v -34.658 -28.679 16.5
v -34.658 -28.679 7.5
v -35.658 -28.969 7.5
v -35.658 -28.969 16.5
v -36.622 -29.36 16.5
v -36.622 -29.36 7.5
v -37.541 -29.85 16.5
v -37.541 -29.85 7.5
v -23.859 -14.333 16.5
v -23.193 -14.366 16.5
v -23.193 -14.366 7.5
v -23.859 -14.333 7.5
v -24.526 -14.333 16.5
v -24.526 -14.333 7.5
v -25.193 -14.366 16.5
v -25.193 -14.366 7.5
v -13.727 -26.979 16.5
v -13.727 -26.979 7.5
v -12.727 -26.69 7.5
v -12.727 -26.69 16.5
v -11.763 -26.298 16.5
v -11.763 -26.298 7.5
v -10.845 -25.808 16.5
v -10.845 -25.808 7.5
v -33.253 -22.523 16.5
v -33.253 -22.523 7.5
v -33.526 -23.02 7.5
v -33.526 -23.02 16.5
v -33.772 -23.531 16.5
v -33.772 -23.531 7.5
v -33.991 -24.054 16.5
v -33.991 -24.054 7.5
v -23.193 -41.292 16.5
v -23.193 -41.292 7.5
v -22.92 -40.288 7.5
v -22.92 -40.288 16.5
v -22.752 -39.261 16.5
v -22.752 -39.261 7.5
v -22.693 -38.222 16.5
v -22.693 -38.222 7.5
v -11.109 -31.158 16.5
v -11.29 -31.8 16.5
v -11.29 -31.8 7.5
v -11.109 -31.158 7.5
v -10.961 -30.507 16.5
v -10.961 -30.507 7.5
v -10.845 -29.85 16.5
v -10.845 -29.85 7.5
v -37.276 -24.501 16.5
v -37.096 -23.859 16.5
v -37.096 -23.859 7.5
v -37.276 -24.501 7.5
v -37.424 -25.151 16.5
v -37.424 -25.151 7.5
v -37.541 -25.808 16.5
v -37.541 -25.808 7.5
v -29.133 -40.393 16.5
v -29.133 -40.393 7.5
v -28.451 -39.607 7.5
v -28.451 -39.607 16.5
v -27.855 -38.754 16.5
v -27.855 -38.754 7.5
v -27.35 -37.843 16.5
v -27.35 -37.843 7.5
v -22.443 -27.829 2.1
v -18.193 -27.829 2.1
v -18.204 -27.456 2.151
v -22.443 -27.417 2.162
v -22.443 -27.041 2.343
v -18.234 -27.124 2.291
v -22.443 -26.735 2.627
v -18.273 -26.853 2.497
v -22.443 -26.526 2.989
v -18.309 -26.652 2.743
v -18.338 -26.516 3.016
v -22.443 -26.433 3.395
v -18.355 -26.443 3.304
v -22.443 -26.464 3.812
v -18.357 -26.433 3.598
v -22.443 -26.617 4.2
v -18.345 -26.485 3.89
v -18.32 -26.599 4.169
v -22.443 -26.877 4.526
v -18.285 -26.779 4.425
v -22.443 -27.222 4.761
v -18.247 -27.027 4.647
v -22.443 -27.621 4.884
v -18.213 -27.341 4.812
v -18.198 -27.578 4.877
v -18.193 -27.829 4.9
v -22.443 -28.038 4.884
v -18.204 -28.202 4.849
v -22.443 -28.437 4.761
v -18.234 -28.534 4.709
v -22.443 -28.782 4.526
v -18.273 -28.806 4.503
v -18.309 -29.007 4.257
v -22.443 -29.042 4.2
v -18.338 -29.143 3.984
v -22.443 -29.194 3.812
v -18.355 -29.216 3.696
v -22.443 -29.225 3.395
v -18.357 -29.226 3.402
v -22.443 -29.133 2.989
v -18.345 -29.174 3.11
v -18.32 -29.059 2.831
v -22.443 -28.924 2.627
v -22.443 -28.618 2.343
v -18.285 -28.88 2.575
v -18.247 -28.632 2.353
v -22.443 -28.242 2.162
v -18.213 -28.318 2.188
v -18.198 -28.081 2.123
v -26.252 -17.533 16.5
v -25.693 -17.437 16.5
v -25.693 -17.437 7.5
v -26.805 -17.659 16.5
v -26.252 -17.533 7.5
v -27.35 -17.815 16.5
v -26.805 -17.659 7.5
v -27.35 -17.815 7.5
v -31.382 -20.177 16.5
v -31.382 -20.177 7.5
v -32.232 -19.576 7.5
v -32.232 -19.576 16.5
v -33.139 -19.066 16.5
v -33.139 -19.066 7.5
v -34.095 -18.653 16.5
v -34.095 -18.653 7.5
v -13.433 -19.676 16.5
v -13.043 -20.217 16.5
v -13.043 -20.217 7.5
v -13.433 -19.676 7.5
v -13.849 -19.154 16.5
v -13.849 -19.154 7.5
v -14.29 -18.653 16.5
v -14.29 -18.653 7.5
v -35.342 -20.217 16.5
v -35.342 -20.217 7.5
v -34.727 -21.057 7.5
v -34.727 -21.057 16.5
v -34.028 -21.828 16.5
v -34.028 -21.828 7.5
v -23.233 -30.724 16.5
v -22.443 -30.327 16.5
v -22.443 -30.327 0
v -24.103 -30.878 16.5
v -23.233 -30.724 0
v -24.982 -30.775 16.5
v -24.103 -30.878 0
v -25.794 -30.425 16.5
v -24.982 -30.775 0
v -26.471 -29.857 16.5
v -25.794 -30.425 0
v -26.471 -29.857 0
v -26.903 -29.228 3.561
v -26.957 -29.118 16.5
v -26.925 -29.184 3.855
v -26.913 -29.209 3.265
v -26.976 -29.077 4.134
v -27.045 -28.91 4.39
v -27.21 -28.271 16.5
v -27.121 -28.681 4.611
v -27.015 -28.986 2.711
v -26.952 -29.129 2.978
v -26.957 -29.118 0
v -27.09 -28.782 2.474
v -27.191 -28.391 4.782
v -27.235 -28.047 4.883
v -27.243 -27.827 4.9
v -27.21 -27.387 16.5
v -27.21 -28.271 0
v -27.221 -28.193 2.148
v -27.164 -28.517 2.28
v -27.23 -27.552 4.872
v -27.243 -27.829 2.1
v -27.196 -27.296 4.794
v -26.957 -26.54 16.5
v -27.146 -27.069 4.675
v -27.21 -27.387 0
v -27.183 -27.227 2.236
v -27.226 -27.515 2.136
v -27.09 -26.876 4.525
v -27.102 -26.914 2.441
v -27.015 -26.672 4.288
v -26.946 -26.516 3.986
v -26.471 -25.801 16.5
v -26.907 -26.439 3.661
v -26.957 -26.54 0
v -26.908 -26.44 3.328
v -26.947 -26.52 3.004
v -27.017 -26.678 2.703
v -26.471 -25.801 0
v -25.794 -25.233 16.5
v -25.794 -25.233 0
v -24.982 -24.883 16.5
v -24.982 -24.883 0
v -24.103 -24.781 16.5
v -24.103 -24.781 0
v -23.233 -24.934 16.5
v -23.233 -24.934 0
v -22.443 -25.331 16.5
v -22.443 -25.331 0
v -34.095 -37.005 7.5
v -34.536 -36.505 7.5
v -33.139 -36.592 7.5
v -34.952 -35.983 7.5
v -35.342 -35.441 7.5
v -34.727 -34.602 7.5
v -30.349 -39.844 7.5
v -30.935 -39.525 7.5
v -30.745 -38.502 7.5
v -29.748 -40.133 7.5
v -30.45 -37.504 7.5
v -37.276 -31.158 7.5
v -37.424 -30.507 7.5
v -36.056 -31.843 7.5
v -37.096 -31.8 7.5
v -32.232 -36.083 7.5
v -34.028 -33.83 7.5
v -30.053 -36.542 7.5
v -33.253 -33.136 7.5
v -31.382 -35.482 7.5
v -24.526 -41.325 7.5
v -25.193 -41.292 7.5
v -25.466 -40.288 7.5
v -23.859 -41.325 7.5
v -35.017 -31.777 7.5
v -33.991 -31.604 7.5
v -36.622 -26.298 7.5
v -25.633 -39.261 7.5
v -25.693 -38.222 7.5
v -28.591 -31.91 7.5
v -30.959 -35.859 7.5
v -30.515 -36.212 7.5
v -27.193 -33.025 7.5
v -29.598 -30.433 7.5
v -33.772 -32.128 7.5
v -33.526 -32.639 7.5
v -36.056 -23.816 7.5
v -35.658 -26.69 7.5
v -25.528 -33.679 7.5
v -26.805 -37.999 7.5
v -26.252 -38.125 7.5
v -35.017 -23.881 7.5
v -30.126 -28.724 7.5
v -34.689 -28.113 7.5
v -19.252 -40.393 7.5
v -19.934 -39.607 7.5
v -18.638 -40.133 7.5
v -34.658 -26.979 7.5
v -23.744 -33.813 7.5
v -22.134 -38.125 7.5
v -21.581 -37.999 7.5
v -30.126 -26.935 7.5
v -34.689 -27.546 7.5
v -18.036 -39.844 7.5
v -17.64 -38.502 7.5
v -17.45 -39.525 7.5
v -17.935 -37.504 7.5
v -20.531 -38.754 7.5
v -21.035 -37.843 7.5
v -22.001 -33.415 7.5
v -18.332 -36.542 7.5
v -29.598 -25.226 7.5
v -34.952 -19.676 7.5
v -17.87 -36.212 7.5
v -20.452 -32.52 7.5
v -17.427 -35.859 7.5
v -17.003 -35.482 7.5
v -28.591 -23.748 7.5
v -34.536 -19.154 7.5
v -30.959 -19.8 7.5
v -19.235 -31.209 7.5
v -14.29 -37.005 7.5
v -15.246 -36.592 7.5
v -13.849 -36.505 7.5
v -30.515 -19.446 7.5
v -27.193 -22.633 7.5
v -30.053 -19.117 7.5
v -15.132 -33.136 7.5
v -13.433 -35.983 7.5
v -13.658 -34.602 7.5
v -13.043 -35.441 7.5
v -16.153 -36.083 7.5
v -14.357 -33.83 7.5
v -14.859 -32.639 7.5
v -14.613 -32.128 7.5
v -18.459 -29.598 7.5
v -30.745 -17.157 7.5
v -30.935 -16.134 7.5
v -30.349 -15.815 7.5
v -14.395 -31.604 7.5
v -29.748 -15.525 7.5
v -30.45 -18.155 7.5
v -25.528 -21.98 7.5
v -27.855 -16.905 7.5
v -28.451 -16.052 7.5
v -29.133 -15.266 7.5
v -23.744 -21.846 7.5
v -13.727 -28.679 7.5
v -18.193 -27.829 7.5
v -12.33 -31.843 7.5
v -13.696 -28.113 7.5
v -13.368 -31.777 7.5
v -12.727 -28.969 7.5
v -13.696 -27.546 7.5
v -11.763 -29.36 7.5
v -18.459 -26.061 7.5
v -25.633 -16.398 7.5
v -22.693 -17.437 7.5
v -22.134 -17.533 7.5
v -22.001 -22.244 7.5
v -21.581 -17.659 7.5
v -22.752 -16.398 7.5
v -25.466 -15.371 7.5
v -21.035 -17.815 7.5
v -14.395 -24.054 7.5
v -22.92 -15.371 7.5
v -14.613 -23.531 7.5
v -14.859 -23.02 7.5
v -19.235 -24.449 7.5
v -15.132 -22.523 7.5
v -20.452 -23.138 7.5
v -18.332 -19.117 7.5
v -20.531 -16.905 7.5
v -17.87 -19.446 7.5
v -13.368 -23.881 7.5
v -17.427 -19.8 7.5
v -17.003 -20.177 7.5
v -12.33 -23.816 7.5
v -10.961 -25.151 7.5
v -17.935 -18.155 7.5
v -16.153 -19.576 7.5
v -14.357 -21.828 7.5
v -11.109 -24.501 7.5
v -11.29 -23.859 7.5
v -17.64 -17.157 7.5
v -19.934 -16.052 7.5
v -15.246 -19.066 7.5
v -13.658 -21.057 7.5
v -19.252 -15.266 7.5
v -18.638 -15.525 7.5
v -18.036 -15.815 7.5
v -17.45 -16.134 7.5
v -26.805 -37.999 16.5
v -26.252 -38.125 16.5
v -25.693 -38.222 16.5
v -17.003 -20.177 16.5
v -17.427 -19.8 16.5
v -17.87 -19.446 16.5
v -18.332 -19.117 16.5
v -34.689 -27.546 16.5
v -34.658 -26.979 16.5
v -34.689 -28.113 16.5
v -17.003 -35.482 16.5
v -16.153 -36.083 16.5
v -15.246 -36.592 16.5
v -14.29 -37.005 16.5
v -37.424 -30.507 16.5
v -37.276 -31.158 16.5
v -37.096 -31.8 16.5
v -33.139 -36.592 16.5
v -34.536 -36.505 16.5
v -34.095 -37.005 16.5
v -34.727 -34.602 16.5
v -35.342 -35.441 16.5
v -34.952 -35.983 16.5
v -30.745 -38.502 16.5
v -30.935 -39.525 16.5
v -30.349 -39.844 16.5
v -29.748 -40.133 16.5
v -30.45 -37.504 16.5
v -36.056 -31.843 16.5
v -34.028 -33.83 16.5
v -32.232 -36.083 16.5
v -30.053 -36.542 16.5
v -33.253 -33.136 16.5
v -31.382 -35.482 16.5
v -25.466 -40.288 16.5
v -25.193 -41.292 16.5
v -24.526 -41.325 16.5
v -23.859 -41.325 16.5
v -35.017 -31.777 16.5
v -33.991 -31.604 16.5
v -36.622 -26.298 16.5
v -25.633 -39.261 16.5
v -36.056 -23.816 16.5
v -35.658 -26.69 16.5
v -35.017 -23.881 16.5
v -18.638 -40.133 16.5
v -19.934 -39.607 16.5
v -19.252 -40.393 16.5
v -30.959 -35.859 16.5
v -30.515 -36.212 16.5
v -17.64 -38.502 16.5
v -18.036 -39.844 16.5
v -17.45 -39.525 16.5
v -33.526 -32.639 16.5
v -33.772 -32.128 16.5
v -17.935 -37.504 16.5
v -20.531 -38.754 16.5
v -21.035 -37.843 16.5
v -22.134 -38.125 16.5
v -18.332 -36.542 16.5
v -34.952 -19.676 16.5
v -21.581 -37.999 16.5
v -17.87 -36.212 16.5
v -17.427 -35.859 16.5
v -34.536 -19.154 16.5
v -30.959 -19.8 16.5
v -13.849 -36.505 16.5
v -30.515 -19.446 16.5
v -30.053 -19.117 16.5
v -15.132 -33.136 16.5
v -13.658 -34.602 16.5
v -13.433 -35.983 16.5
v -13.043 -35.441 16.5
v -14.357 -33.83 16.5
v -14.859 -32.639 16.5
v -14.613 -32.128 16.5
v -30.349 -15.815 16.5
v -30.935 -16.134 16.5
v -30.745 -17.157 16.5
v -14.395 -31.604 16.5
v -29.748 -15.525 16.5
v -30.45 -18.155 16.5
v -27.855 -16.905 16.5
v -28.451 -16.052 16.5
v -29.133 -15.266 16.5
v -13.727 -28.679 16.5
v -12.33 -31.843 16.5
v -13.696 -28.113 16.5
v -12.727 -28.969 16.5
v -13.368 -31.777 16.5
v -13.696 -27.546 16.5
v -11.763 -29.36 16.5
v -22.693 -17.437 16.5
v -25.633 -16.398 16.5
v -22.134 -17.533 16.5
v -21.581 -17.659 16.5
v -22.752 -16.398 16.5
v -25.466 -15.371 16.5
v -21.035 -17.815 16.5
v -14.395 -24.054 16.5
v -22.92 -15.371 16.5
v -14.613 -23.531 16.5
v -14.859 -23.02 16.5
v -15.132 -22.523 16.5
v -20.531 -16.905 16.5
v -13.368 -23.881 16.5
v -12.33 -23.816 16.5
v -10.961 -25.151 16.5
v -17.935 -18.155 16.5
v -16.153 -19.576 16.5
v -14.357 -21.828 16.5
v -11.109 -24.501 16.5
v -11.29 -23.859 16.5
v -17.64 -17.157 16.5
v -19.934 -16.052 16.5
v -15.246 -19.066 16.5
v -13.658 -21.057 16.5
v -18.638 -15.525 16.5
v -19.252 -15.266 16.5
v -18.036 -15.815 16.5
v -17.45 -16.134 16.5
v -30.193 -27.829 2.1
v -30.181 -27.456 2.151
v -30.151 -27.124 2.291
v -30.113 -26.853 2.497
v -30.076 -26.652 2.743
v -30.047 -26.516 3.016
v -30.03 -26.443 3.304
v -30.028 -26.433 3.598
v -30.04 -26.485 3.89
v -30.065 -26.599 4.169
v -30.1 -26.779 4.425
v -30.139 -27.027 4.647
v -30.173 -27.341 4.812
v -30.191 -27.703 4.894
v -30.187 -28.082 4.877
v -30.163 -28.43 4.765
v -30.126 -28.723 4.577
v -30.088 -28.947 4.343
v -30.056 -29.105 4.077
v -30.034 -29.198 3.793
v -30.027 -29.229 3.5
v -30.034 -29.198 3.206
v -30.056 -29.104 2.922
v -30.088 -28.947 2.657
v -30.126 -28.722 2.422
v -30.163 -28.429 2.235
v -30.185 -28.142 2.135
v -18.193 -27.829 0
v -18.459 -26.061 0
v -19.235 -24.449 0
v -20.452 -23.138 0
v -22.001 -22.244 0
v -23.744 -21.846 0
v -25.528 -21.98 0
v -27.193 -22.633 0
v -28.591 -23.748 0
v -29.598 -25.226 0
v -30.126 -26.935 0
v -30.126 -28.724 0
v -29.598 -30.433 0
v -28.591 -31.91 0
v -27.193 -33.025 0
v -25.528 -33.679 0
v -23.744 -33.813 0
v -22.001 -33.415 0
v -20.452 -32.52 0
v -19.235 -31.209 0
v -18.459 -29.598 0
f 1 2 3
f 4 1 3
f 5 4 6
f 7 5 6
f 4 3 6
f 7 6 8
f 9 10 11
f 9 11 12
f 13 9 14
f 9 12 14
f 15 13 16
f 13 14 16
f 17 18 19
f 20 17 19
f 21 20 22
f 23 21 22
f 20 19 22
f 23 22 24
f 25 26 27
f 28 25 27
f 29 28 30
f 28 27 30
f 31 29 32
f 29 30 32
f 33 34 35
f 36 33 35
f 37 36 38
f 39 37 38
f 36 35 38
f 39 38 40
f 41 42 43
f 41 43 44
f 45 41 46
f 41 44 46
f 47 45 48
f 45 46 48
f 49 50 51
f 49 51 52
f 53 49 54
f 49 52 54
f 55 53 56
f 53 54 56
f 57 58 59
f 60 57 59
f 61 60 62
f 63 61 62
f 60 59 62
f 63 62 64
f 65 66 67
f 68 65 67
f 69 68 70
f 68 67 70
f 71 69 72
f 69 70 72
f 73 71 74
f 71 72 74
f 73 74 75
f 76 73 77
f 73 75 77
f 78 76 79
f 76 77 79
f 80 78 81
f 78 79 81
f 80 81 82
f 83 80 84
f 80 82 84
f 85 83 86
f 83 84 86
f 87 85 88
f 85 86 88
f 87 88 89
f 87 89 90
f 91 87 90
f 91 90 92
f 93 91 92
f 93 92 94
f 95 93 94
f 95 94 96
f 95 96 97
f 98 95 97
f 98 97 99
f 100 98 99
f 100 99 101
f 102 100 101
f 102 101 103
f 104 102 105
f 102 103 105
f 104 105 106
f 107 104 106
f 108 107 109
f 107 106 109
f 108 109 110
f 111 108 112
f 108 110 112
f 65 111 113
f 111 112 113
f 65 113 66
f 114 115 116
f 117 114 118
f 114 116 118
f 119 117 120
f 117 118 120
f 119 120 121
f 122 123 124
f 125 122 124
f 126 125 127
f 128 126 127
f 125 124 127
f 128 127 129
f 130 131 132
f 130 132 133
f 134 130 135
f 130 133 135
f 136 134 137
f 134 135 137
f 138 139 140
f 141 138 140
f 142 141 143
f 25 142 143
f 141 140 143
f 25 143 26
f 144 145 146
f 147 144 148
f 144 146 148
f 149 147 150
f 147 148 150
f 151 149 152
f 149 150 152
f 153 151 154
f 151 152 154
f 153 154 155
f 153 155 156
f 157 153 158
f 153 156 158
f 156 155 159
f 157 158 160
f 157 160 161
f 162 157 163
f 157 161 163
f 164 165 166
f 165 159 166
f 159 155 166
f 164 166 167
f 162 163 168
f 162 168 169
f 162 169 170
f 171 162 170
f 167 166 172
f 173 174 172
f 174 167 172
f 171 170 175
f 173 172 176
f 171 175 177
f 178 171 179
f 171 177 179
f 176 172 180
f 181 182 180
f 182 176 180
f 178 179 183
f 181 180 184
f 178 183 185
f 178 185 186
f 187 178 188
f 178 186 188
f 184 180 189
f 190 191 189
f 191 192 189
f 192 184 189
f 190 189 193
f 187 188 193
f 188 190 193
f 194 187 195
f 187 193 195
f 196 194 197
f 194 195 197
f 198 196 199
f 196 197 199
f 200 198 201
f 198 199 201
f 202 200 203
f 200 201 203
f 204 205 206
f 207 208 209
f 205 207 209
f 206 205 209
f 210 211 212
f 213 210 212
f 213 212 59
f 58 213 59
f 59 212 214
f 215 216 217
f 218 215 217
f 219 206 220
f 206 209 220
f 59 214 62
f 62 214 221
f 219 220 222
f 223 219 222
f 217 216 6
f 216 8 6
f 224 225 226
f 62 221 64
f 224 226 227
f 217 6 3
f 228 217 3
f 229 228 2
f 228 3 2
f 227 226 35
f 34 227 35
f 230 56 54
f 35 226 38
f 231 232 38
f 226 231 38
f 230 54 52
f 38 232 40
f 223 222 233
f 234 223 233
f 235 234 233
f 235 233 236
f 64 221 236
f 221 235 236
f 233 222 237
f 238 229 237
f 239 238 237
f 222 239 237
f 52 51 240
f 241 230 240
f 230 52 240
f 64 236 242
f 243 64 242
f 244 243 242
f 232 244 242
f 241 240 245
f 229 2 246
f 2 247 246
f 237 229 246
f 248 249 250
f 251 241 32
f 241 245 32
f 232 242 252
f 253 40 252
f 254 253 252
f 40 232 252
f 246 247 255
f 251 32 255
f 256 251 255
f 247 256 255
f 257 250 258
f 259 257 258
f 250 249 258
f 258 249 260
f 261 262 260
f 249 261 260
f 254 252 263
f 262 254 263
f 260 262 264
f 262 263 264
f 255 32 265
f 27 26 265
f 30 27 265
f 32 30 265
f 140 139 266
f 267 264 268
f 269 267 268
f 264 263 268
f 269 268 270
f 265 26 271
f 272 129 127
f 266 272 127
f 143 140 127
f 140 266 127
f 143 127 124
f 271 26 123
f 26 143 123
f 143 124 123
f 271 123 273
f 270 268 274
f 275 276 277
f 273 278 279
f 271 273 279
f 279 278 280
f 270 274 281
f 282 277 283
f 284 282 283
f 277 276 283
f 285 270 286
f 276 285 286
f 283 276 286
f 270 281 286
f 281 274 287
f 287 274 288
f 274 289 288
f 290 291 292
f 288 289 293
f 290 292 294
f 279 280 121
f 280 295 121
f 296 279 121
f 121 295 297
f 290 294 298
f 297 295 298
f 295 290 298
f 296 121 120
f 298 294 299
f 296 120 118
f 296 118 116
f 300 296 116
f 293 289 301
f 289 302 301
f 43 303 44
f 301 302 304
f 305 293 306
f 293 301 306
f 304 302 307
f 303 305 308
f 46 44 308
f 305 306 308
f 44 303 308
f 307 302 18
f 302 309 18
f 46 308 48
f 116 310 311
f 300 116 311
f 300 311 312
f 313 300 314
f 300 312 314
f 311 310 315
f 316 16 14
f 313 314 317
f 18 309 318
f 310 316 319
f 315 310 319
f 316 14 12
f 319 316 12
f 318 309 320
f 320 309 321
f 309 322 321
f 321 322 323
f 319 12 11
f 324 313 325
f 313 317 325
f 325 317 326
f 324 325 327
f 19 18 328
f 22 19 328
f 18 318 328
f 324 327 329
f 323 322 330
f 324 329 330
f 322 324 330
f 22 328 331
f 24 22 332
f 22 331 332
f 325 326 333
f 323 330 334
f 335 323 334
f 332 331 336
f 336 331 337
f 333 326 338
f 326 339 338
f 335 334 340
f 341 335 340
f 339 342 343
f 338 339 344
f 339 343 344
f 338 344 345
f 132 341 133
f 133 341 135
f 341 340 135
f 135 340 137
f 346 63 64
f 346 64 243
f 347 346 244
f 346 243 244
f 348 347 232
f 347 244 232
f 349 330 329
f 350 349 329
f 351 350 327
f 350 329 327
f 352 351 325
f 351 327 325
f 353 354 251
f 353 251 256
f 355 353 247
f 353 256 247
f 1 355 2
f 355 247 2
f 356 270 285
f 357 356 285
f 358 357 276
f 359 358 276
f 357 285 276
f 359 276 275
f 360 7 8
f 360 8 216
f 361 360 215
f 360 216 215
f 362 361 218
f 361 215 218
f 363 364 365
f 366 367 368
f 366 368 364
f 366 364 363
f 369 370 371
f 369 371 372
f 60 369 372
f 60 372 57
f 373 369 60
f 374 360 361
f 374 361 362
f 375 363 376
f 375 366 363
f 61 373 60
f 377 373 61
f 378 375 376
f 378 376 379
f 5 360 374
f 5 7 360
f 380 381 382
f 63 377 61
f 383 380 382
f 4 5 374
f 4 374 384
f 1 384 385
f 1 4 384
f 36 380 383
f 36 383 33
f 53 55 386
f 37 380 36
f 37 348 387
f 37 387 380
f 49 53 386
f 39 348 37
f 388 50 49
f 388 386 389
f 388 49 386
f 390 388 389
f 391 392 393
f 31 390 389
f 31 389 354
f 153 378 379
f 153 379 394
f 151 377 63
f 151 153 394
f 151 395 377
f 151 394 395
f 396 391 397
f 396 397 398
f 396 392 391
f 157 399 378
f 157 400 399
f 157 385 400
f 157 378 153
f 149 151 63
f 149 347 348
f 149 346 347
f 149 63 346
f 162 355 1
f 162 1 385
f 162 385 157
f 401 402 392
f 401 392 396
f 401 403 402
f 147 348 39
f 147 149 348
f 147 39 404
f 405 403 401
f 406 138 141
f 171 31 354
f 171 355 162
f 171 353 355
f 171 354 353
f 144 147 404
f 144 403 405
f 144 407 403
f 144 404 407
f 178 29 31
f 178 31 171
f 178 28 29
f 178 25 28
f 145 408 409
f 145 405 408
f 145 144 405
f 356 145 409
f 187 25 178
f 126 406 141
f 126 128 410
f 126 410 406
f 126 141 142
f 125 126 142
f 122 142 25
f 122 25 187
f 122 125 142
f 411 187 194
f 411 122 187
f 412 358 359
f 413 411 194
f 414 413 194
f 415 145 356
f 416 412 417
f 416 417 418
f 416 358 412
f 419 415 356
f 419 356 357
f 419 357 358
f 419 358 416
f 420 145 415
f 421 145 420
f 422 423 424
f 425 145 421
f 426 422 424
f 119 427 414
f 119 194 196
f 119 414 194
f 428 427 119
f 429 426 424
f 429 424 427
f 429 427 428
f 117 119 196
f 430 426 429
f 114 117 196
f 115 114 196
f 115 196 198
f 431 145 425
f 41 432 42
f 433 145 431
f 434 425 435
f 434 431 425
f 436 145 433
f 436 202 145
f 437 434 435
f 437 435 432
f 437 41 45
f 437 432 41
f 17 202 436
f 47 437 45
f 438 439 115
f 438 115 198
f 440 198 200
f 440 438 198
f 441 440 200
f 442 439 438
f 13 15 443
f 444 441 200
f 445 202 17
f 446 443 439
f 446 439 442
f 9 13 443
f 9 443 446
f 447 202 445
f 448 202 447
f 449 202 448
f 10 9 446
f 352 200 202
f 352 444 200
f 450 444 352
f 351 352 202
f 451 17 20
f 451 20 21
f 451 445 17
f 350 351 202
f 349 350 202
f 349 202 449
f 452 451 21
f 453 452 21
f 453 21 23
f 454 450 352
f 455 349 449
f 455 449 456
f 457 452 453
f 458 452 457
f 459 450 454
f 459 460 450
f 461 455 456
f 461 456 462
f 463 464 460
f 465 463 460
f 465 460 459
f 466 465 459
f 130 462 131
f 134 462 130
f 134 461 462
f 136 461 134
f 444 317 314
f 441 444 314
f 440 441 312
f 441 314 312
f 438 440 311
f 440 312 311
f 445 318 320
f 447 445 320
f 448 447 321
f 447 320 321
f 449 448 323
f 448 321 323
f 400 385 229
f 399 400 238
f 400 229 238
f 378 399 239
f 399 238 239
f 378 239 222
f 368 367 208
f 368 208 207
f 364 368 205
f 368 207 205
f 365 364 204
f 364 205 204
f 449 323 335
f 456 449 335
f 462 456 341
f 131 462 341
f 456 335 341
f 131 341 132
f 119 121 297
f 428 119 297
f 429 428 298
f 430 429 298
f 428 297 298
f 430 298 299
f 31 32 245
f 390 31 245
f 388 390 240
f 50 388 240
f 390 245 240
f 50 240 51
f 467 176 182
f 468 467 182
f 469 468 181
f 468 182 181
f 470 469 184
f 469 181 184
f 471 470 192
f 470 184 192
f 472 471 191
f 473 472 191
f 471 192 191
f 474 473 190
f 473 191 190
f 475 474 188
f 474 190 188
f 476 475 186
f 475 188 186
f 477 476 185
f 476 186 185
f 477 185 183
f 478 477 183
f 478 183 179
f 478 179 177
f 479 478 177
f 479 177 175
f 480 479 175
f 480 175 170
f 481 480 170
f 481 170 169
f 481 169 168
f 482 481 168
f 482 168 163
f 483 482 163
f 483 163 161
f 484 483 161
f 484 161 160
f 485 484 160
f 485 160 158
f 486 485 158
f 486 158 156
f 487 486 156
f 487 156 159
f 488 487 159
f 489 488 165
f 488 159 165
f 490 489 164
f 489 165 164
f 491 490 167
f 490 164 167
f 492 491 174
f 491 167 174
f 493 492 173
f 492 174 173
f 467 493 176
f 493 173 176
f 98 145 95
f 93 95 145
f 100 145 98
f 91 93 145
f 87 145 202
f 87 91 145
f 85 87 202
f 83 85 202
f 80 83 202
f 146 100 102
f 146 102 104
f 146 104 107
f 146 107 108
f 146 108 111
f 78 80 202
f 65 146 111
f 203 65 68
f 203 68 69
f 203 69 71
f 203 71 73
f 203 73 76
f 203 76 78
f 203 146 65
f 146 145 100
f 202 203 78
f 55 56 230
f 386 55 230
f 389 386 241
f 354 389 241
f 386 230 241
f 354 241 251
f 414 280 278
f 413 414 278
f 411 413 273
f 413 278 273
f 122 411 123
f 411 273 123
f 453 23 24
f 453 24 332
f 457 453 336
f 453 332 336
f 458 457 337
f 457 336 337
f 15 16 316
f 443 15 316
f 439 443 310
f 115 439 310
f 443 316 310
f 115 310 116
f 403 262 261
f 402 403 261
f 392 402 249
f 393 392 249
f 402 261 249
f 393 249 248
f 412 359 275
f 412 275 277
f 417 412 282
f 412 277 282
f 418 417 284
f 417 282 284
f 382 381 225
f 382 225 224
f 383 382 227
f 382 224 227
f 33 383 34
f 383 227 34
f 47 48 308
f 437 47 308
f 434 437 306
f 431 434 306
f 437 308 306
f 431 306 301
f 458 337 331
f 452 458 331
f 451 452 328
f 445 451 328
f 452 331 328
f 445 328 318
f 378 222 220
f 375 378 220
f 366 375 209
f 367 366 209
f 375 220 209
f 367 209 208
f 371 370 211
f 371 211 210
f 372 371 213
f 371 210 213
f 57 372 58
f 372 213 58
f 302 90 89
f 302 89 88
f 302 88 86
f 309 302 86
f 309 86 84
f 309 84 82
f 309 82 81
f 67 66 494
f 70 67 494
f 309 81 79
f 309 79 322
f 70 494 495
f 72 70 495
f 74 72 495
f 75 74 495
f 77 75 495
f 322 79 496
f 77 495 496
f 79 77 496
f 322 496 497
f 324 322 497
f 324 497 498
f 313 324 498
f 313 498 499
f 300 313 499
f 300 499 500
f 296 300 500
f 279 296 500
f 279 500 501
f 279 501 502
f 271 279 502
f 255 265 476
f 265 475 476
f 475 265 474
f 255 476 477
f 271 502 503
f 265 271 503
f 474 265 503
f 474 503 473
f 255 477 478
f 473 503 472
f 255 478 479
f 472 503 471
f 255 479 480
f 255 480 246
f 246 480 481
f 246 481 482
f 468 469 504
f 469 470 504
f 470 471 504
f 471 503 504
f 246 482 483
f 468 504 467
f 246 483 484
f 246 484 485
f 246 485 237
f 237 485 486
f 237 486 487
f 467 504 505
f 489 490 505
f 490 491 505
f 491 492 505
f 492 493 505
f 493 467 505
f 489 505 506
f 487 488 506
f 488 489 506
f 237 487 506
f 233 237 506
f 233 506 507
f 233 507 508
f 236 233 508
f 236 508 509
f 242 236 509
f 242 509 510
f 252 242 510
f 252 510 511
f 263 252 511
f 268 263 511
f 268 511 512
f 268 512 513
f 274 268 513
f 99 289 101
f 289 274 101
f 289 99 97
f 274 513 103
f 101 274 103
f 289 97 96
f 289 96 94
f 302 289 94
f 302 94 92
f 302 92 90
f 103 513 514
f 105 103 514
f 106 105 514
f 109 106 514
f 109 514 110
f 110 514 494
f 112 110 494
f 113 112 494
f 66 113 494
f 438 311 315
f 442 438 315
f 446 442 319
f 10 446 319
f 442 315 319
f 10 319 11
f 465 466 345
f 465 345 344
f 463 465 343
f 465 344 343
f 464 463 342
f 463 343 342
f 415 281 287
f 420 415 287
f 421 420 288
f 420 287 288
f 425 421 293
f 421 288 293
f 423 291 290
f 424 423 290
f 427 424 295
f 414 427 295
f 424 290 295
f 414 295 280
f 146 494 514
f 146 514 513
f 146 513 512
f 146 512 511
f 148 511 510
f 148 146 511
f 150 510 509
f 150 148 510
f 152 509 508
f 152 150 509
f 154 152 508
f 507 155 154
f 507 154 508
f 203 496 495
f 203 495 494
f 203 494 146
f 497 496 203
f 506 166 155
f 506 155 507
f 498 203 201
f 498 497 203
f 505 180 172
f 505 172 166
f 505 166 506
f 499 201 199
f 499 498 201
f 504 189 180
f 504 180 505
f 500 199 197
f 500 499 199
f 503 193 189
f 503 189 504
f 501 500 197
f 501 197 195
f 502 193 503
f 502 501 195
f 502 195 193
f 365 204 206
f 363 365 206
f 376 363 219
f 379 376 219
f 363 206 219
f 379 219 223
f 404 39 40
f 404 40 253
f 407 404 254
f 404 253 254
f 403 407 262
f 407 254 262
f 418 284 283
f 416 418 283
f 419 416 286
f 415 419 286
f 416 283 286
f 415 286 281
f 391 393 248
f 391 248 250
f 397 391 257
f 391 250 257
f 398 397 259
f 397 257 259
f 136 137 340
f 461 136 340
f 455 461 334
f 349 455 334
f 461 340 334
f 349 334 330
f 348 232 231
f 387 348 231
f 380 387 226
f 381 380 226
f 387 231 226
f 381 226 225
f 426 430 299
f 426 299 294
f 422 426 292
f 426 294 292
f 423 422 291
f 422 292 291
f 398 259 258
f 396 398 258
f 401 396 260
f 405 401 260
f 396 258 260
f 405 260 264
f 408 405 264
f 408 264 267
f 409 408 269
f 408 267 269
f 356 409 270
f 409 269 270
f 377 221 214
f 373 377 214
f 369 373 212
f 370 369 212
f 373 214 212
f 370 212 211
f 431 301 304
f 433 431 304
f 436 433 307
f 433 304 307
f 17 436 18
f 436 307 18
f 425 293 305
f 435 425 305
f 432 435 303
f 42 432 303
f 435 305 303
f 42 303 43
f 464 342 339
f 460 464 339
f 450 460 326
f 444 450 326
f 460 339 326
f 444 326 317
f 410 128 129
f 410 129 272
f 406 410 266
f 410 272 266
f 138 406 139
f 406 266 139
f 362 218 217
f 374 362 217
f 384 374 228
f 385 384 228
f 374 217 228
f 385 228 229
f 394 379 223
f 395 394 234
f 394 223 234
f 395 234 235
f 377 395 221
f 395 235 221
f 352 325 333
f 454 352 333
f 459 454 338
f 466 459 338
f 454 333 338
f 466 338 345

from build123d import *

# Parameters (mm, degrees)
SKETCH1_R               = 6
SKETCH1_R_2             = 3.05
BOSS_EXTRUDE1_DEPTH     = 7.5
SKETCH2_R               = 10.5
BOSS_EXTRUDE3_DEPTH     = 9
BOSS_EXTRUDE4_DEPTH     = 9
CIRPATTERN1_COUNT       = 14
SKETCH3_R               = 3.05
CUT_EXTRUDE1_DEPTH      = 10
SKETCH5_W               = 1.3
SKETCH5_H               = 8.98796618
BOSS_EXTRUDE5_DEPTH     = 16.5
SKETCH4_R               = 1.4
CUT_EXTRUDE2_DEPTH      = 1
CUT_EXTRUDE2_DEPTH_BACK = 38.540546983


with BuildPart() as part:
    # Sketch1 → Boss-Extrude1 (new body)
    with BuildSketch(Plane.XY):
        with Locations((-24.192657344, -27.82930415)):
            Circle(SKETCH1_R)
        with Locations((-24.192657344, -27.82930415)):
            Circle(SKETCH1_R_2, mode=Mode.SUBTRACT)
    extrude(amount=BOSS_EXTRUDE1_DEPTH)

    # Sketch2 → Boss-Extrude3 (add)
    with BuildSketch(Plane.XY.offset(7.5)):
        with Locations((-24.192657344, -27.82930415)):
            Circle(SKETCH2_R)
    extrude(amount=BOSS_EXTRUDE3_DEPTH)

    # Sketch2<4> → Boss-Extrude4 (add)
    with BuildSketch(Plane.XY.offset(7.5)):
        with BuildLine():
            ThreePointArc((-22.692657344, -17.436999304), (-22.822516009, -15.882132595), (-23.192657344, -14.366392132))
            ThreePointArc((-23.192657344, -14.366392132), (-24.192657344, -14.32930415), (-25.192657344, -14.366392132))
            ThreePointArc((-25.192657344, -14.366392132), (-25.562798679, -15.882132595), (-25.692657344, -17.436999304))
            ThreePointArc((-25.692657344, -17.436999304), (-24.192657344, -17.32930415), (-22.692657344, -17.436999304))
        make_face()
    boss_extrude4 = extrude(amount=BOSS_EXTRUDE4_DEPTH)

    # CirPattern1: Boss-Extrude4 ×14 about axis
    cirpattern1_axis = Axis((-24.192657344, -27.82930415, 0), (0, 0, 1))
    for i in range(1, CIRPATTERN1_COUNT):
        add(boss_extrude4.rotate(cirpattern1_axis, i * 360 / CIRPATTERN1_COUNT))

    # Sketch3 → Cut-Extrude1 (cut, through all)
    with BuildSketch(Plane(origin=(0, 0, 7.5), x_dir=(-1, 0, 0), z_dir=(0, 0, -1))):
        with Locations((24.192657344, -27.82930415)):
            Circle(SKETCH3_R)
    extrude(amount=-CUT_EXTRUDE1_DEPTH, mode=Mode.SUBTRACT)

    # Sketch5 → Boss-Extrude5 (add, through all)
    with BuildSketch(Plane(origin=(0, 0, 0), x_dir=(-1, 0, 0), z_dir=(0, 0, -1))):
        with Locations((21.792657344, -27.156324883)):
            Rectangle(SKETCH5_W, SKETCH5_H)
    extrude(amount=-BOSS_EXTRUDE5_DEPTH)

    # Sketch4 → Cut-Extrude2 (cut, two sides)
    with BuildSketch(Plane(origin=(0, 0, 0), x_dir=(0, 0, -1), z_dir=(1, 0, 0))) as cut_extrude2_sk:
        with Locations((-3.5, -27.82930415)):
            Circle(SKETCH4_R)
    extrude(amount=CUT_EXTRUDE2_DEPTH, mode=Mode.SUBTRACT)
    extrude(cut_extrude2_sk.sketch, amount=-CUT_EXTRUDE2_DEPTH_BACK, mode=Mode.SUBTRACT)


solid = part.part
